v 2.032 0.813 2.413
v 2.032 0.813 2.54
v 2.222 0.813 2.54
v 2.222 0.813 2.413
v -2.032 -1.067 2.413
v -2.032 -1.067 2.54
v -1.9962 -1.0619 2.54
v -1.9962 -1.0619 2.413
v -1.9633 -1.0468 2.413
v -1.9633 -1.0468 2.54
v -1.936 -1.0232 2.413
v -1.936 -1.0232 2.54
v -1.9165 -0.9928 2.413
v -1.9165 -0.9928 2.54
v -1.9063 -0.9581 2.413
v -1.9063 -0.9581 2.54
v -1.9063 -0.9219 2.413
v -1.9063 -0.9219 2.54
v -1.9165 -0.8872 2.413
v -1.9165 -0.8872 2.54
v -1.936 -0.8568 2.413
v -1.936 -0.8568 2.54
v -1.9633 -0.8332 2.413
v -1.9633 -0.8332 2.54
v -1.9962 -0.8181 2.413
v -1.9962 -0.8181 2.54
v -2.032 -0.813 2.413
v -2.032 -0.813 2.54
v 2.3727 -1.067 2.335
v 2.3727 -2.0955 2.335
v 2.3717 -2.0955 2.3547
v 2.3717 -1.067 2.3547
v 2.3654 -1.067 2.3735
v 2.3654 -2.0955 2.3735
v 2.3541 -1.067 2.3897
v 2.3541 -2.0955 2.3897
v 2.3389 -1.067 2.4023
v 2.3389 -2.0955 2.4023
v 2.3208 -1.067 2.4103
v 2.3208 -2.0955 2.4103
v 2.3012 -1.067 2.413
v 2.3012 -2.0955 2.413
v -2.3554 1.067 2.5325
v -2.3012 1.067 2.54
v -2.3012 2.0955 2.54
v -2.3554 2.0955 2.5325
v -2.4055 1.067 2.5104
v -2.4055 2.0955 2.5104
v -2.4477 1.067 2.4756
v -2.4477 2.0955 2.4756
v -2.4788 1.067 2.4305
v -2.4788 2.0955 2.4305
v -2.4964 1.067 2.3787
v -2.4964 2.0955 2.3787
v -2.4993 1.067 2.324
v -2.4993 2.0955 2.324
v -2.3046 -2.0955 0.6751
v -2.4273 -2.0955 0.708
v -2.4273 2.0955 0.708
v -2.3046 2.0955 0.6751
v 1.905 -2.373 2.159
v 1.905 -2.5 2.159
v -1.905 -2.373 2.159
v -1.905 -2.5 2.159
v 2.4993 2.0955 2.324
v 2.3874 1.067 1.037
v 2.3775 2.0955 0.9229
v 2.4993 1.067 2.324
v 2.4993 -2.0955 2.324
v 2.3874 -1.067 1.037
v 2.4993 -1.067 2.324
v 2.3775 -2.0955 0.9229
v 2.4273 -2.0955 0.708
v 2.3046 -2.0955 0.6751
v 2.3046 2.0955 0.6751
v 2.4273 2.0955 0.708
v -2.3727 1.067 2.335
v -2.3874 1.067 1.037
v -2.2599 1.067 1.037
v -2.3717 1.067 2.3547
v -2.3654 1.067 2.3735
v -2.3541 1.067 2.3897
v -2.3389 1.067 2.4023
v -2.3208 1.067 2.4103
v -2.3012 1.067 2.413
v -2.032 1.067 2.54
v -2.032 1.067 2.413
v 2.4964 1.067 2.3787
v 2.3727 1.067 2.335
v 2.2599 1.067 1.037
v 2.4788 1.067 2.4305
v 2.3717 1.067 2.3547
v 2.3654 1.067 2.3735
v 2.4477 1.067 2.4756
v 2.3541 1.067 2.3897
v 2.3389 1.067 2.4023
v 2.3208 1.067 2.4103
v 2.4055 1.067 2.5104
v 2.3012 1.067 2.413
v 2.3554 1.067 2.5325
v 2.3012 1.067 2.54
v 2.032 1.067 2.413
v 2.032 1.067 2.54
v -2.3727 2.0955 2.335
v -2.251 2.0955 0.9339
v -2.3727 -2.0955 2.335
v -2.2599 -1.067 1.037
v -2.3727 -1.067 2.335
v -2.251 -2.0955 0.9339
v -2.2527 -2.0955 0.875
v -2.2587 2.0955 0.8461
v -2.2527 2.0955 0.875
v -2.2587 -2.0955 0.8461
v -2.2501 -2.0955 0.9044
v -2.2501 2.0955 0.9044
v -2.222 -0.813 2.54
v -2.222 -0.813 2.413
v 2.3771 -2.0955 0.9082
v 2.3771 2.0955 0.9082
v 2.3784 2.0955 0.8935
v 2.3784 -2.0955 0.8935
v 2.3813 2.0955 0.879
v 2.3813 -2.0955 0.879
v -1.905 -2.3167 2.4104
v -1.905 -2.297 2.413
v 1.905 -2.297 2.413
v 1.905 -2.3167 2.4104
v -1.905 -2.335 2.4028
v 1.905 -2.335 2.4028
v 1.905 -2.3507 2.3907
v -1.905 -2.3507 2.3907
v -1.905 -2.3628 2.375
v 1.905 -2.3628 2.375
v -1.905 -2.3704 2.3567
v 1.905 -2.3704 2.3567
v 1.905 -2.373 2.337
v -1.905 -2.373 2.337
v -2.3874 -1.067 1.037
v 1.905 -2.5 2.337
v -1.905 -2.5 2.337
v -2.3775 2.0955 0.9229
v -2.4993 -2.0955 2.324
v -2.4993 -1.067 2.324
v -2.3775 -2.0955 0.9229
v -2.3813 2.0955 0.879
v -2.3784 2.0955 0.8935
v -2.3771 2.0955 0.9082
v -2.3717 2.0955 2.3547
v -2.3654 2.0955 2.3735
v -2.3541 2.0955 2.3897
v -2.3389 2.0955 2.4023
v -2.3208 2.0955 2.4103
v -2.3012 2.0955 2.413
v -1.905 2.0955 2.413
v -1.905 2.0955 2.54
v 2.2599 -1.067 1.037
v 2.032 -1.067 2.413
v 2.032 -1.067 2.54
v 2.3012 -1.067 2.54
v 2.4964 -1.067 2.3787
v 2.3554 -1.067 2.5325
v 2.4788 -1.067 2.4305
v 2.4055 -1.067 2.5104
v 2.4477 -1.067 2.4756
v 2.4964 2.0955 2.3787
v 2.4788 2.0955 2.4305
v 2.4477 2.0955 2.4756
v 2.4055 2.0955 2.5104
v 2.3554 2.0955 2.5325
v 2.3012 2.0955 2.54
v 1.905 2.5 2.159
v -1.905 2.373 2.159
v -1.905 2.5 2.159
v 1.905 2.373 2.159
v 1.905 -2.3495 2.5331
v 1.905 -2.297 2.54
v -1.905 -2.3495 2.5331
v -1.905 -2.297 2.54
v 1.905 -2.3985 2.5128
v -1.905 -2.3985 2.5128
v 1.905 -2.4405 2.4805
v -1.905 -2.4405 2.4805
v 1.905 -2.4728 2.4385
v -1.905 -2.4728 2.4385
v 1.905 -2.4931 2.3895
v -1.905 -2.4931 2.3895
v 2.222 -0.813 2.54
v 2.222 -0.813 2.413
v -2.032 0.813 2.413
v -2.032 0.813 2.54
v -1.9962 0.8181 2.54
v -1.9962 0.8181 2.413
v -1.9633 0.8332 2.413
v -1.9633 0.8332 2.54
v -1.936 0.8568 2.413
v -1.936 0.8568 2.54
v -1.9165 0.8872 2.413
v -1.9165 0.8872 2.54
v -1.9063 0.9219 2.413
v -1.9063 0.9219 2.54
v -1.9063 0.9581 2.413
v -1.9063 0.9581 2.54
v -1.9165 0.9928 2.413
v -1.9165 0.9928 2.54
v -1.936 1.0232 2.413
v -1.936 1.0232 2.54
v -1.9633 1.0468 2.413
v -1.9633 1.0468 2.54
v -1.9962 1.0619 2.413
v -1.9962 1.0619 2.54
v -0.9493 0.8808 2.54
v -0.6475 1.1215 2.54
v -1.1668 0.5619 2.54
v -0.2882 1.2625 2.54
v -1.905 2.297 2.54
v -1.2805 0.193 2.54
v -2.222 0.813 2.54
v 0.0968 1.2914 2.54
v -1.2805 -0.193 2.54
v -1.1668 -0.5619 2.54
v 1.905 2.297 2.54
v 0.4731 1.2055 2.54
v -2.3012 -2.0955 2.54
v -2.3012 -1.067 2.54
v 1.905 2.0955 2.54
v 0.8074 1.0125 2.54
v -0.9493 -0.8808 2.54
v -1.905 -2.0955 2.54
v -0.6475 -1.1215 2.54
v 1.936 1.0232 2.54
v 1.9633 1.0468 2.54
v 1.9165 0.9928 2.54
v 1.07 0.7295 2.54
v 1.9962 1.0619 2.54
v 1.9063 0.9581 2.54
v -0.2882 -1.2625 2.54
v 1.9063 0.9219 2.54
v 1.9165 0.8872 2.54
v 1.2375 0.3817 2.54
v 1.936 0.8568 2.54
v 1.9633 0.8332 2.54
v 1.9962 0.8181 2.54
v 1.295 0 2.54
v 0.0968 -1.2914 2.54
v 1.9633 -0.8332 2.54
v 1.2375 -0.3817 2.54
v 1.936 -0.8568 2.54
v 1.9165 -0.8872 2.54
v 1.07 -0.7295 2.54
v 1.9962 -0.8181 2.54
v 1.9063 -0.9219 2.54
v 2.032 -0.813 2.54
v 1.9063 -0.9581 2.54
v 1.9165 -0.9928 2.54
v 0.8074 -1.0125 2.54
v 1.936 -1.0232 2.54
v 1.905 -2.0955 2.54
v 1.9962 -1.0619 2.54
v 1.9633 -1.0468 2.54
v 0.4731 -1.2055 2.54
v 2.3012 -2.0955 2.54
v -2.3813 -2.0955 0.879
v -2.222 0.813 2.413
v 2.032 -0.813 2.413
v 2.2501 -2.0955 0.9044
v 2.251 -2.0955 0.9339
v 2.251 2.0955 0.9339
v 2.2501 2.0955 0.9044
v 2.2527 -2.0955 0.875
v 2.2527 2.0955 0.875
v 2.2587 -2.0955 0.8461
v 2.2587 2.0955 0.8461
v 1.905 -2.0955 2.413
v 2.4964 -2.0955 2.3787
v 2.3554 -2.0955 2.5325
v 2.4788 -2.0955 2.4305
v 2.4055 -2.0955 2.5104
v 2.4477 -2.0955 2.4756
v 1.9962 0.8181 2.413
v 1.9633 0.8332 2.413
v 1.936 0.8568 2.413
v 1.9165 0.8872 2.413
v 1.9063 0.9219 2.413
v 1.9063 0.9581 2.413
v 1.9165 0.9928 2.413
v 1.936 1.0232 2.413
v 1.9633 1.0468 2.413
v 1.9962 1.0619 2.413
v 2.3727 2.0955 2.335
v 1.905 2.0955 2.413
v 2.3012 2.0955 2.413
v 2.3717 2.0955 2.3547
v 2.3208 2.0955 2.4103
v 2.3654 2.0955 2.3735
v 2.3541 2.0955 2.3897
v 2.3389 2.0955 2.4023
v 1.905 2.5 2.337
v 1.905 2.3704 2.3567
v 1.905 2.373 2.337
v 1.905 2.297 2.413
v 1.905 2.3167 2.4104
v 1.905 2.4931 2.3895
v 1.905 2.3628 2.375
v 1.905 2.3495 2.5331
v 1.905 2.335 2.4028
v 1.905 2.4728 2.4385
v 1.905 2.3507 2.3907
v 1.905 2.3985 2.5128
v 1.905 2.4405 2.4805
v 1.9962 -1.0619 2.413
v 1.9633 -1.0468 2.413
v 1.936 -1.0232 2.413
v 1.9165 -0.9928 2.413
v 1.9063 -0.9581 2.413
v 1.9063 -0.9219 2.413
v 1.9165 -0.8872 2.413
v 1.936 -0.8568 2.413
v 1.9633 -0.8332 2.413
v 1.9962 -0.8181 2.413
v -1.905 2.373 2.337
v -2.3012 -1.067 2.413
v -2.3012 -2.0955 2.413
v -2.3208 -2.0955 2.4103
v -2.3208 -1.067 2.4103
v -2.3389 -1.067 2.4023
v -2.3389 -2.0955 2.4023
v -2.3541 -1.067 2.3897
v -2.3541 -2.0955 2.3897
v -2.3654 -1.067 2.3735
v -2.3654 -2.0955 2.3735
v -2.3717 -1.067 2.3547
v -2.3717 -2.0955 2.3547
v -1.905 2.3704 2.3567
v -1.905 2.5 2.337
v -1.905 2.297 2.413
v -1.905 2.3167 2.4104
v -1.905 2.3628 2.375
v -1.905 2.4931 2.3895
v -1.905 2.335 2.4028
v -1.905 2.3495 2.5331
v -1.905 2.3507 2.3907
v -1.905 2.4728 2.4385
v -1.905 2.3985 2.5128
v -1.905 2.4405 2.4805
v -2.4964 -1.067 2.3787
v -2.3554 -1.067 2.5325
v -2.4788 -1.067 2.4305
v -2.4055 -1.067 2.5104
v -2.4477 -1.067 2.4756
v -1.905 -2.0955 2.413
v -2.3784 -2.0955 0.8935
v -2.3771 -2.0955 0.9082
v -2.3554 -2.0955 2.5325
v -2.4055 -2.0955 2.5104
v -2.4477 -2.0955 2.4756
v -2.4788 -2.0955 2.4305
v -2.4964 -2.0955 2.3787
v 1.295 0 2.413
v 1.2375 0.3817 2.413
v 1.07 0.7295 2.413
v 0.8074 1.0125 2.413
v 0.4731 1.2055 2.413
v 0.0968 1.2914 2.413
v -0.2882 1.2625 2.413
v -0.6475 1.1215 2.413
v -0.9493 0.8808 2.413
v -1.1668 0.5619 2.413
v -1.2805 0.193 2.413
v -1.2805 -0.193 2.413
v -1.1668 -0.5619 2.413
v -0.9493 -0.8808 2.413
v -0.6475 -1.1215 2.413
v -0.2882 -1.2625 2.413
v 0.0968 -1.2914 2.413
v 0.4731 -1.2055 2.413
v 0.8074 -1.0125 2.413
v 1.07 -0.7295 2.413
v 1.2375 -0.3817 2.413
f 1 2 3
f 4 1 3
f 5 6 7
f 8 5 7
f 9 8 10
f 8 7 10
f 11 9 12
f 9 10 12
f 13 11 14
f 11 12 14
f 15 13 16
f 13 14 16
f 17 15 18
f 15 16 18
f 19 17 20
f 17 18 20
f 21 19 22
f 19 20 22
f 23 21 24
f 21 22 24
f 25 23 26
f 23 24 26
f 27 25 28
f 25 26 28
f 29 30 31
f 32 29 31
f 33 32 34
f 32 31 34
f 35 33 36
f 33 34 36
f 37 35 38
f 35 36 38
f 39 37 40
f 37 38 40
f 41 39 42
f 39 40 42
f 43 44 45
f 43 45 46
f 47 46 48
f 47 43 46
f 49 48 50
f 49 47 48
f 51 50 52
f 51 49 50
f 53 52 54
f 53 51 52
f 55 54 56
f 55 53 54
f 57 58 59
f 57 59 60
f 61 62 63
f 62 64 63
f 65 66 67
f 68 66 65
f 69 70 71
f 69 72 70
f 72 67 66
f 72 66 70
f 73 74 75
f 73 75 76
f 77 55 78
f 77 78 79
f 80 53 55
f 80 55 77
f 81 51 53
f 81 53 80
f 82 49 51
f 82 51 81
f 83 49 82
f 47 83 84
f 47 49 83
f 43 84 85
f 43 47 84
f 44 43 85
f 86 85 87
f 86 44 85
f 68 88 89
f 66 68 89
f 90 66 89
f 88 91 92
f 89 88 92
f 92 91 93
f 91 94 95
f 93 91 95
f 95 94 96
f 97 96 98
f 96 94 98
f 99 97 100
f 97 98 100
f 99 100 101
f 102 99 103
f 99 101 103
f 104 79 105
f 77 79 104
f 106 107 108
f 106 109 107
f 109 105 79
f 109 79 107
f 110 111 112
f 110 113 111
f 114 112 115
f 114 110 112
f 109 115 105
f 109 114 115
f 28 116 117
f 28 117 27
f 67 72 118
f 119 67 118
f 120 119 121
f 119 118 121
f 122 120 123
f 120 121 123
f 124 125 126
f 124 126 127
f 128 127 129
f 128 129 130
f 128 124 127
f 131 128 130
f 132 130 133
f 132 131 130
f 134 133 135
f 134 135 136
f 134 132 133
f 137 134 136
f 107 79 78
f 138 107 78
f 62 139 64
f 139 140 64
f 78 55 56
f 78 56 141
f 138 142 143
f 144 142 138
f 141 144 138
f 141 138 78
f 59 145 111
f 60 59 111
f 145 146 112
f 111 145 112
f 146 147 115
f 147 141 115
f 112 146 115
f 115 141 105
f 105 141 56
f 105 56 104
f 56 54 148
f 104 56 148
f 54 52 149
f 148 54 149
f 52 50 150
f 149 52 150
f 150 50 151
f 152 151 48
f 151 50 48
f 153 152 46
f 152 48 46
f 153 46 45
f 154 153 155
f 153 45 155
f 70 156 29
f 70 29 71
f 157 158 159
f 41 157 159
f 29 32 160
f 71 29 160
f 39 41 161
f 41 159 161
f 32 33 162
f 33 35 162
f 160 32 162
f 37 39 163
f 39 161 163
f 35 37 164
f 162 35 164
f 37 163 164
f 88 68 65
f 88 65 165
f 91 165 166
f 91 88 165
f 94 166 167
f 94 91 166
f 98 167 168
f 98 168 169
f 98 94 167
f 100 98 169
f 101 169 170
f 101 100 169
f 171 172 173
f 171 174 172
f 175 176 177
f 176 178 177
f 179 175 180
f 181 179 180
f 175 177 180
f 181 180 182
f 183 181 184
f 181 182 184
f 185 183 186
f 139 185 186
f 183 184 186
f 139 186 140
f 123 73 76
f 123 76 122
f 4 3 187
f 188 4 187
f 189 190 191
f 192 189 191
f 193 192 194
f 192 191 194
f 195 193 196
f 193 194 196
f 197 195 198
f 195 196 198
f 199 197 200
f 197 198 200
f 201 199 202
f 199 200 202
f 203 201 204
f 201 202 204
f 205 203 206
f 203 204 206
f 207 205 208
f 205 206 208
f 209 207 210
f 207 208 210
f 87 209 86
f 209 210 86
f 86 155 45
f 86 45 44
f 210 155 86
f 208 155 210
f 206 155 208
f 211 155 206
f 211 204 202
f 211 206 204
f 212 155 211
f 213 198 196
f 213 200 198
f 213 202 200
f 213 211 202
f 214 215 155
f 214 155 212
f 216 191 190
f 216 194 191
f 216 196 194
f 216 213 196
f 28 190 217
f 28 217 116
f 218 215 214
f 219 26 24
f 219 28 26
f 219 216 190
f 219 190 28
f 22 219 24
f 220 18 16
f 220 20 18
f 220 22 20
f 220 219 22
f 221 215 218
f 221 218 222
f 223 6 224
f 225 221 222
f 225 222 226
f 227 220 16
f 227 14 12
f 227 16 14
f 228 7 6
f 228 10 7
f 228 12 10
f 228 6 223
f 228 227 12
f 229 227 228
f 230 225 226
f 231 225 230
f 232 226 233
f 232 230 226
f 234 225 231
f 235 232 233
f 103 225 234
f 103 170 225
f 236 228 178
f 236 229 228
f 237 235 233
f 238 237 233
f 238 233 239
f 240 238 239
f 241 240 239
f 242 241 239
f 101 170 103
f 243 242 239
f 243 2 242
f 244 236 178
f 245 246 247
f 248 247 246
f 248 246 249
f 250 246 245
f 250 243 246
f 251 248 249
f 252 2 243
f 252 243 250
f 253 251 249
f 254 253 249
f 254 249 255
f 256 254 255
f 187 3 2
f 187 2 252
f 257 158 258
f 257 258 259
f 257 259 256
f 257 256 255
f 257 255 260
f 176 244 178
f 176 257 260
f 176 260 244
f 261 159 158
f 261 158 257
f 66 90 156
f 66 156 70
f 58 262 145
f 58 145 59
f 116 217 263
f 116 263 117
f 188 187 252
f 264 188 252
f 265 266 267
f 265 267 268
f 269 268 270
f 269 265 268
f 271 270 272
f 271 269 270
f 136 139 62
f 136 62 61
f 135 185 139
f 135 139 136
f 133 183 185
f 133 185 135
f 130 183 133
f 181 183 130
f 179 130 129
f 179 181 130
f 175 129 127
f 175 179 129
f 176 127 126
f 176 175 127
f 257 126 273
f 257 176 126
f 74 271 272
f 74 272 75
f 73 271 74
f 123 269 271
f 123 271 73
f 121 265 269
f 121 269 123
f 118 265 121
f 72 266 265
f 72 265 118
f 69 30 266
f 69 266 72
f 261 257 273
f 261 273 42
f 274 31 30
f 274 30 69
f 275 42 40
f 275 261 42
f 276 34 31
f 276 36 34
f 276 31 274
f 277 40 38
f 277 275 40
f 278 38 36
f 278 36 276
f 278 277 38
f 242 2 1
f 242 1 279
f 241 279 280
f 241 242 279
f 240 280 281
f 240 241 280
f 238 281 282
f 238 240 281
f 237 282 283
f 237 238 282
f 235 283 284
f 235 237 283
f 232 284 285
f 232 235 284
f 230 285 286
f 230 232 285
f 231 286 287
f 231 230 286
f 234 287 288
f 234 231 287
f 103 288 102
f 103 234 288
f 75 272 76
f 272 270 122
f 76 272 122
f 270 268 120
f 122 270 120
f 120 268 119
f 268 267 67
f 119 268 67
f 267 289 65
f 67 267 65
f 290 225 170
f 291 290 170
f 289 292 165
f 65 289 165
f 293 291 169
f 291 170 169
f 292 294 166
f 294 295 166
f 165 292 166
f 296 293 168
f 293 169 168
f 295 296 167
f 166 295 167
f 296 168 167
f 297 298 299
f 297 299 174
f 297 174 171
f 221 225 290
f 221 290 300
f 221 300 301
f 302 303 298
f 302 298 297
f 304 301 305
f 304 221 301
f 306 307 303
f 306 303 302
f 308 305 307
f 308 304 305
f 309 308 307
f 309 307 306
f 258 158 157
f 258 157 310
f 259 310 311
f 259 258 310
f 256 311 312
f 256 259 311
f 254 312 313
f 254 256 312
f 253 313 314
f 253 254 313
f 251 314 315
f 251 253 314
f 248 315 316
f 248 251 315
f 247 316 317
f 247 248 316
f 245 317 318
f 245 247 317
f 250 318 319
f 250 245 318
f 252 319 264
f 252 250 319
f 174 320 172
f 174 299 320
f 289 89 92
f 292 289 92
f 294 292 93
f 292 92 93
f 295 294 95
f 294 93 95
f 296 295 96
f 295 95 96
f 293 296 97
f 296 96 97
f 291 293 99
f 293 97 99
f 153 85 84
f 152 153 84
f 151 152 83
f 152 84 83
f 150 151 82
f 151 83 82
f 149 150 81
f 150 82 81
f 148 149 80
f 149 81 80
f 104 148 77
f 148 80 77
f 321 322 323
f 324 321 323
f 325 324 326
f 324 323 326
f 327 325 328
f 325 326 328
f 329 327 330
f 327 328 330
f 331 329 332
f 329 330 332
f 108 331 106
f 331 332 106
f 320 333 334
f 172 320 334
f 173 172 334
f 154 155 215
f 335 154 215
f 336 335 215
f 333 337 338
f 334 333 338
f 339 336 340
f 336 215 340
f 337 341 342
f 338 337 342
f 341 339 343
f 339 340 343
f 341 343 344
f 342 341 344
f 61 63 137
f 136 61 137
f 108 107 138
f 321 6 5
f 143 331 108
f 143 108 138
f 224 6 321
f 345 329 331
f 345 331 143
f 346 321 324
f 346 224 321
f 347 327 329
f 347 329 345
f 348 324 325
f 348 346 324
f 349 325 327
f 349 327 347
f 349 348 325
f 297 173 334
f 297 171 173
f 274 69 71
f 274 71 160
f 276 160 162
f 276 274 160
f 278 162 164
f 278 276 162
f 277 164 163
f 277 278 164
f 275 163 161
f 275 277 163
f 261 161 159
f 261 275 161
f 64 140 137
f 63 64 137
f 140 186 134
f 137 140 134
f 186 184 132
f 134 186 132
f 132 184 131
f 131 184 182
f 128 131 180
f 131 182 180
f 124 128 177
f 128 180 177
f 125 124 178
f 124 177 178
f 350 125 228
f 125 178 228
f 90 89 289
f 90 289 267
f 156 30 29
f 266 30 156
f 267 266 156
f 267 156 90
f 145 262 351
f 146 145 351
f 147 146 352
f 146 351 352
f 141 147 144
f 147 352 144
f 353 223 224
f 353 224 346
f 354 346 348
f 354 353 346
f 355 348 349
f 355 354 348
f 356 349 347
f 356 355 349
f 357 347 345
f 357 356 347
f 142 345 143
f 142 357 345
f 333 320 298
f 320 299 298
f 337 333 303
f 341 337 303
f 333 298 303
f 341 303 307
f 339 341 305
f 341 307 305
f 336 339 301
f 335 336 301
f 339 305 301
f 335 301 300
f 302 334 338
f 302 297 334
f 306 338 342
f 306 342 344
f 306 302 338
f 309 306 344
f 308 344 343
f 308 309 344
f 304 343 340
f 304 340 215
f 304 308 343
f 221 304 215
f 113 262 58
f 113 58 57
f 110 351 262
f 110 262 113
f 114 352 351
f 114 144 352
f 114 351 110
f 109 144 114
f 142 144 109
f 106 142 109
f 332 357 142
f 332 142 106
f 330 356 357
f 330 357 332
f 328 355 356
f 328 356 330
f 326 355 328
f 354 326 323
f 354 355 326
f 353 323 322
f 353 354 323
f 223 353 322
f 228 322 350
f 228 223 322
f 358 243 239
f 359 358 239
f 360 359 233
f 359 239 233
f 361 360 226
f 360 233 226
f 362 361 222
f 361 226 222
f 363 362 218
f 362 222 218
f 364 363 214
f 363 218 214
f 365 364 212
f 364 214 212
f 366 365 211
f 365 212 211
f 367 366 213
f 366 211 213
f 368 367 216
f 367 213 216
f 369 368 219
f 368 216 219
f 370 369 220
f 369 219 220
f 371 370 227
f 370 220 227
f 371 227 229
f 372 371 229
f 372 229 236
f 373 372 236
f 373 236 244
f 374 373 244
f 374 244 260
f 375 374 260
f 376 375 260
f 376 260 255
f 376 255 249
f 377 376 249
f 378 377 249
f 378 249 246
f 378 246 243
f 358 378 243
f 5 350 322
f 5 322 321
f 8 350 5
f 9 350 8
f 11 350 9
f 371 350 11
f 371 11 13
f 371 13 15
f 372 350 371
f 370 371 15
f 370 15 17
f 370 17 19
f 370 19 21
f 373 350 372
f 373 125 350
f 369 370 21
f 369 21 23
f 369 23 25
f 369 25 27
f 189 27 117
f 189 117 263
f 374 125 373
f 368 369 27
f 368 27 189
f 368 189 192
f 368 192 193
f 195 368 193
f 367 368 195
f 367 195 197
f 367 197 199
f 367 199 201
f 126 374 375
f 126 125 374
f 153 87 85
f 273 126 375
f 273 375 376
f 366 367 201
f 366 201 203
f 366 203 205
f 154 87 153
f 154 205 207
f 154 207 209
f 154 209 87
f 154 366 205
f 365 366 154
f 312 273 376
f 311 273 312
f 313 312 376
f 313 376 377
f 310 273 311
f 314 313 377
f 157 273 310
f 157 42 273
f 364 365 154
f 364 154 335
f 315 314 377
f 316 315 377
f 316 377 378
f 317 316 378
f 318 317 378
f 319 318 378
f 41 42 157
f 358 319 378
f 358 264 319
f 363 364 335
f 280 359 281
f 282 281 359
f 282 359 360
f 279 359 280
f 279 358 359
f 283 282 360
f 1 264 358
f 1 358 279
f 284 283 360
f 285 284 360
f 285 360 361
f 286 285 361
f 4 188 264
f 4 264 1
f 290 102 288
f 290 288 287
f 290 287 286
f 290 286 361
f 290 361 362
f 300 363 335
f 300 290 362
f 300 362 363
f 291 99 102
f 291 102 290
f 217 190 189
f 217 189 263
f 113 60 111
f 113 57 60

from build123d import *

# Parameters (mm, degrees)
PAD004_DEPTH      = 2.0955
PAD004_DEPTH_BACK = 2.0955
PAD005_DEPTH      = 1.905
PAD005_DEPTH_BACK = 1.905
POCKET001_DEPTH   = 1.503
SKETCH010_R       = 1.295
POCKET002_DEPTH   = 1.86594


with BuildPart() as part:
    # Sketch007 → Pad004 (new body, two sides)
    with BuildSketch(Plane.XZ) as pad004_sk:
        with BuildLine():
            Line((-2.250954, -1.606066), (-2.37273, -0.205003))
            ThreePointArc((-2.301215, -0.127), (-2.354127, -0.150274), (-2.37273, -0.205003))
            Line((-2.301215, -0.127), (2.301215, -0.127))
            ThreePointArc((2.37273, -0.205001), (2.354126, -0.150273), (2.301215, -0.127))
            Line((2.37273, -0.205001), (2.250954, -1.606066))
            ThreePointArc((2.250954, -1.606066), (2.250979, -1.650341), (2.258692, -1.69394))
            Line((2.258692, -1.69394), (2.304615, -1.86494))
            Line((2.304615, -1.86494), (2.427269, -1.832))
            Line((2.427269, -1.832), (2.381346, -1.661))
            ThreePointArc((2.377477, -1.617063), (2.37749, -1.639201), (2.381346, -1.661))
            Line((2.377477, -1.617063), (2.499253, -0.215998))
            ThreePointArc((2.499253, -0.215998), (2.447736, -0.064446), (2.301215, 0))
            Line((2.301215, 0), (-2.301215, 0))
            ThreePointArc((-2.301215, 0), (-2.447737, -0.064447), (-2.499253, -0.216))
            Line((-2.499253, -0.216), (-2.377477, -1.617063))
            ThreePointArc((-2.381346, -1.661), (-2.37749, -1.639201), (-2.377477, -1.617063))
            Line((-2.381346, -1.661), (-2.427269, -1.832))
            Line((-2.427269, -1.832), (-2.304615, -1.86494))
            Line((-2.304615, -1.86494), (-2.258692, -1.69394))
            ThreePointArc((-2.258692, -1.69394), (-2.250979, -1.650341), (-2.250954, -1.606066))
        make_face()
    extrude(amount=PAD004_DEPTH)
    extrude(pad004_sk.sketch, amount=-PAD004_DEPTH_BACK)

    # Sketch008 → Pad005 (join, two sides)
    with BuildSketch(Plane.YZ) as pad005_sk:
        with BuildLine():
            Line((2.297, 0), (-2.297, 0))
            ThreePointArc((-2.297, 0), (-2.440543, -0.059457), (-2.5, -0.203))
            Line((-2.5, -0.203), (-2.5, -0.381))
            Line((-2.5, -0.381), (-2.373, -0.381))
            Line((-2.373, -0.381), (-2.373, -0.203))
            ThreePointArc((-2.297, -0.127), (-2.35074, -0.14926), (-2.373, -0.203))
            Line((-2.297, -0.127), (2.297, -0.127))
            ThreePointArc((2.373, -0.203), (2.35074, -0.14926), (2.297, -0.127))
            Line((2.373, -0.203), (2.373, -0.381))
            Line((2.373, -0.381), (2.5, -0.381))
            Line((2.5, -0.381), (2.5, -0.203))
            ThreePointArc((2.5, -0.203), (2.440543, -0.059457), (2.297, 0))
        make_face()
    extrude(amount=PAD005_DEPTH)
    extrude(pad005_sk.sketch, amount=-PAD005_DEPTH_BACK)

    # Sketch009 → Pocket001 (cut)
    with BuildSketch(Plane.XY):
        with BuildLine():
            Line((-2.722, 1.067), (-2.032, 1.067))
            ThreePointArc((-2.032, 0.813), (-1.905, 0.94), (-2.032, 1.067))
            Line((-2.032, 0.813), (-2.222, 0.813))
            Line((-2.222, 0.813), (-2.222, -0.813))
            Line((-2.222, -0.813), (-2.032, -0.813))
            ThreePointArc((-2.032, -1.067), (-1.905, -0.94), (-2.032, -0.813))
            Line((-2.032, -1.067), (-2.722, -1.067))
            Line((-2.722, -1.067), (-2.722, 1.067))
        make_face()
    pocket001 = extrude(amount=-POCKET001_DEPTH, mode=Mode.SUBTRACT)

    # Mirrored001: Pocket001 across Sketch009 V_Axis
    add(pocket001.mirror(Plane(origin=(0, 0, 0), x_dir=(0, 0, 1), z_dir=(1, 0, 0))), mode=Mode.SUBTRACT)

    # Sketch010 → Pocket002 (cut, through all)
    with BuildSketch(Plane.XY):
        Circle(SKETCH010_R)
    extrude(amount=-POCKET002_DEPTH, mode=Mode.SUBTRACT)


with BuildPart() as part_1:
    # Body002 placement: moved
    add(part.part.moved(Location((0, 0, 2.54))))


solid = part_1.part
